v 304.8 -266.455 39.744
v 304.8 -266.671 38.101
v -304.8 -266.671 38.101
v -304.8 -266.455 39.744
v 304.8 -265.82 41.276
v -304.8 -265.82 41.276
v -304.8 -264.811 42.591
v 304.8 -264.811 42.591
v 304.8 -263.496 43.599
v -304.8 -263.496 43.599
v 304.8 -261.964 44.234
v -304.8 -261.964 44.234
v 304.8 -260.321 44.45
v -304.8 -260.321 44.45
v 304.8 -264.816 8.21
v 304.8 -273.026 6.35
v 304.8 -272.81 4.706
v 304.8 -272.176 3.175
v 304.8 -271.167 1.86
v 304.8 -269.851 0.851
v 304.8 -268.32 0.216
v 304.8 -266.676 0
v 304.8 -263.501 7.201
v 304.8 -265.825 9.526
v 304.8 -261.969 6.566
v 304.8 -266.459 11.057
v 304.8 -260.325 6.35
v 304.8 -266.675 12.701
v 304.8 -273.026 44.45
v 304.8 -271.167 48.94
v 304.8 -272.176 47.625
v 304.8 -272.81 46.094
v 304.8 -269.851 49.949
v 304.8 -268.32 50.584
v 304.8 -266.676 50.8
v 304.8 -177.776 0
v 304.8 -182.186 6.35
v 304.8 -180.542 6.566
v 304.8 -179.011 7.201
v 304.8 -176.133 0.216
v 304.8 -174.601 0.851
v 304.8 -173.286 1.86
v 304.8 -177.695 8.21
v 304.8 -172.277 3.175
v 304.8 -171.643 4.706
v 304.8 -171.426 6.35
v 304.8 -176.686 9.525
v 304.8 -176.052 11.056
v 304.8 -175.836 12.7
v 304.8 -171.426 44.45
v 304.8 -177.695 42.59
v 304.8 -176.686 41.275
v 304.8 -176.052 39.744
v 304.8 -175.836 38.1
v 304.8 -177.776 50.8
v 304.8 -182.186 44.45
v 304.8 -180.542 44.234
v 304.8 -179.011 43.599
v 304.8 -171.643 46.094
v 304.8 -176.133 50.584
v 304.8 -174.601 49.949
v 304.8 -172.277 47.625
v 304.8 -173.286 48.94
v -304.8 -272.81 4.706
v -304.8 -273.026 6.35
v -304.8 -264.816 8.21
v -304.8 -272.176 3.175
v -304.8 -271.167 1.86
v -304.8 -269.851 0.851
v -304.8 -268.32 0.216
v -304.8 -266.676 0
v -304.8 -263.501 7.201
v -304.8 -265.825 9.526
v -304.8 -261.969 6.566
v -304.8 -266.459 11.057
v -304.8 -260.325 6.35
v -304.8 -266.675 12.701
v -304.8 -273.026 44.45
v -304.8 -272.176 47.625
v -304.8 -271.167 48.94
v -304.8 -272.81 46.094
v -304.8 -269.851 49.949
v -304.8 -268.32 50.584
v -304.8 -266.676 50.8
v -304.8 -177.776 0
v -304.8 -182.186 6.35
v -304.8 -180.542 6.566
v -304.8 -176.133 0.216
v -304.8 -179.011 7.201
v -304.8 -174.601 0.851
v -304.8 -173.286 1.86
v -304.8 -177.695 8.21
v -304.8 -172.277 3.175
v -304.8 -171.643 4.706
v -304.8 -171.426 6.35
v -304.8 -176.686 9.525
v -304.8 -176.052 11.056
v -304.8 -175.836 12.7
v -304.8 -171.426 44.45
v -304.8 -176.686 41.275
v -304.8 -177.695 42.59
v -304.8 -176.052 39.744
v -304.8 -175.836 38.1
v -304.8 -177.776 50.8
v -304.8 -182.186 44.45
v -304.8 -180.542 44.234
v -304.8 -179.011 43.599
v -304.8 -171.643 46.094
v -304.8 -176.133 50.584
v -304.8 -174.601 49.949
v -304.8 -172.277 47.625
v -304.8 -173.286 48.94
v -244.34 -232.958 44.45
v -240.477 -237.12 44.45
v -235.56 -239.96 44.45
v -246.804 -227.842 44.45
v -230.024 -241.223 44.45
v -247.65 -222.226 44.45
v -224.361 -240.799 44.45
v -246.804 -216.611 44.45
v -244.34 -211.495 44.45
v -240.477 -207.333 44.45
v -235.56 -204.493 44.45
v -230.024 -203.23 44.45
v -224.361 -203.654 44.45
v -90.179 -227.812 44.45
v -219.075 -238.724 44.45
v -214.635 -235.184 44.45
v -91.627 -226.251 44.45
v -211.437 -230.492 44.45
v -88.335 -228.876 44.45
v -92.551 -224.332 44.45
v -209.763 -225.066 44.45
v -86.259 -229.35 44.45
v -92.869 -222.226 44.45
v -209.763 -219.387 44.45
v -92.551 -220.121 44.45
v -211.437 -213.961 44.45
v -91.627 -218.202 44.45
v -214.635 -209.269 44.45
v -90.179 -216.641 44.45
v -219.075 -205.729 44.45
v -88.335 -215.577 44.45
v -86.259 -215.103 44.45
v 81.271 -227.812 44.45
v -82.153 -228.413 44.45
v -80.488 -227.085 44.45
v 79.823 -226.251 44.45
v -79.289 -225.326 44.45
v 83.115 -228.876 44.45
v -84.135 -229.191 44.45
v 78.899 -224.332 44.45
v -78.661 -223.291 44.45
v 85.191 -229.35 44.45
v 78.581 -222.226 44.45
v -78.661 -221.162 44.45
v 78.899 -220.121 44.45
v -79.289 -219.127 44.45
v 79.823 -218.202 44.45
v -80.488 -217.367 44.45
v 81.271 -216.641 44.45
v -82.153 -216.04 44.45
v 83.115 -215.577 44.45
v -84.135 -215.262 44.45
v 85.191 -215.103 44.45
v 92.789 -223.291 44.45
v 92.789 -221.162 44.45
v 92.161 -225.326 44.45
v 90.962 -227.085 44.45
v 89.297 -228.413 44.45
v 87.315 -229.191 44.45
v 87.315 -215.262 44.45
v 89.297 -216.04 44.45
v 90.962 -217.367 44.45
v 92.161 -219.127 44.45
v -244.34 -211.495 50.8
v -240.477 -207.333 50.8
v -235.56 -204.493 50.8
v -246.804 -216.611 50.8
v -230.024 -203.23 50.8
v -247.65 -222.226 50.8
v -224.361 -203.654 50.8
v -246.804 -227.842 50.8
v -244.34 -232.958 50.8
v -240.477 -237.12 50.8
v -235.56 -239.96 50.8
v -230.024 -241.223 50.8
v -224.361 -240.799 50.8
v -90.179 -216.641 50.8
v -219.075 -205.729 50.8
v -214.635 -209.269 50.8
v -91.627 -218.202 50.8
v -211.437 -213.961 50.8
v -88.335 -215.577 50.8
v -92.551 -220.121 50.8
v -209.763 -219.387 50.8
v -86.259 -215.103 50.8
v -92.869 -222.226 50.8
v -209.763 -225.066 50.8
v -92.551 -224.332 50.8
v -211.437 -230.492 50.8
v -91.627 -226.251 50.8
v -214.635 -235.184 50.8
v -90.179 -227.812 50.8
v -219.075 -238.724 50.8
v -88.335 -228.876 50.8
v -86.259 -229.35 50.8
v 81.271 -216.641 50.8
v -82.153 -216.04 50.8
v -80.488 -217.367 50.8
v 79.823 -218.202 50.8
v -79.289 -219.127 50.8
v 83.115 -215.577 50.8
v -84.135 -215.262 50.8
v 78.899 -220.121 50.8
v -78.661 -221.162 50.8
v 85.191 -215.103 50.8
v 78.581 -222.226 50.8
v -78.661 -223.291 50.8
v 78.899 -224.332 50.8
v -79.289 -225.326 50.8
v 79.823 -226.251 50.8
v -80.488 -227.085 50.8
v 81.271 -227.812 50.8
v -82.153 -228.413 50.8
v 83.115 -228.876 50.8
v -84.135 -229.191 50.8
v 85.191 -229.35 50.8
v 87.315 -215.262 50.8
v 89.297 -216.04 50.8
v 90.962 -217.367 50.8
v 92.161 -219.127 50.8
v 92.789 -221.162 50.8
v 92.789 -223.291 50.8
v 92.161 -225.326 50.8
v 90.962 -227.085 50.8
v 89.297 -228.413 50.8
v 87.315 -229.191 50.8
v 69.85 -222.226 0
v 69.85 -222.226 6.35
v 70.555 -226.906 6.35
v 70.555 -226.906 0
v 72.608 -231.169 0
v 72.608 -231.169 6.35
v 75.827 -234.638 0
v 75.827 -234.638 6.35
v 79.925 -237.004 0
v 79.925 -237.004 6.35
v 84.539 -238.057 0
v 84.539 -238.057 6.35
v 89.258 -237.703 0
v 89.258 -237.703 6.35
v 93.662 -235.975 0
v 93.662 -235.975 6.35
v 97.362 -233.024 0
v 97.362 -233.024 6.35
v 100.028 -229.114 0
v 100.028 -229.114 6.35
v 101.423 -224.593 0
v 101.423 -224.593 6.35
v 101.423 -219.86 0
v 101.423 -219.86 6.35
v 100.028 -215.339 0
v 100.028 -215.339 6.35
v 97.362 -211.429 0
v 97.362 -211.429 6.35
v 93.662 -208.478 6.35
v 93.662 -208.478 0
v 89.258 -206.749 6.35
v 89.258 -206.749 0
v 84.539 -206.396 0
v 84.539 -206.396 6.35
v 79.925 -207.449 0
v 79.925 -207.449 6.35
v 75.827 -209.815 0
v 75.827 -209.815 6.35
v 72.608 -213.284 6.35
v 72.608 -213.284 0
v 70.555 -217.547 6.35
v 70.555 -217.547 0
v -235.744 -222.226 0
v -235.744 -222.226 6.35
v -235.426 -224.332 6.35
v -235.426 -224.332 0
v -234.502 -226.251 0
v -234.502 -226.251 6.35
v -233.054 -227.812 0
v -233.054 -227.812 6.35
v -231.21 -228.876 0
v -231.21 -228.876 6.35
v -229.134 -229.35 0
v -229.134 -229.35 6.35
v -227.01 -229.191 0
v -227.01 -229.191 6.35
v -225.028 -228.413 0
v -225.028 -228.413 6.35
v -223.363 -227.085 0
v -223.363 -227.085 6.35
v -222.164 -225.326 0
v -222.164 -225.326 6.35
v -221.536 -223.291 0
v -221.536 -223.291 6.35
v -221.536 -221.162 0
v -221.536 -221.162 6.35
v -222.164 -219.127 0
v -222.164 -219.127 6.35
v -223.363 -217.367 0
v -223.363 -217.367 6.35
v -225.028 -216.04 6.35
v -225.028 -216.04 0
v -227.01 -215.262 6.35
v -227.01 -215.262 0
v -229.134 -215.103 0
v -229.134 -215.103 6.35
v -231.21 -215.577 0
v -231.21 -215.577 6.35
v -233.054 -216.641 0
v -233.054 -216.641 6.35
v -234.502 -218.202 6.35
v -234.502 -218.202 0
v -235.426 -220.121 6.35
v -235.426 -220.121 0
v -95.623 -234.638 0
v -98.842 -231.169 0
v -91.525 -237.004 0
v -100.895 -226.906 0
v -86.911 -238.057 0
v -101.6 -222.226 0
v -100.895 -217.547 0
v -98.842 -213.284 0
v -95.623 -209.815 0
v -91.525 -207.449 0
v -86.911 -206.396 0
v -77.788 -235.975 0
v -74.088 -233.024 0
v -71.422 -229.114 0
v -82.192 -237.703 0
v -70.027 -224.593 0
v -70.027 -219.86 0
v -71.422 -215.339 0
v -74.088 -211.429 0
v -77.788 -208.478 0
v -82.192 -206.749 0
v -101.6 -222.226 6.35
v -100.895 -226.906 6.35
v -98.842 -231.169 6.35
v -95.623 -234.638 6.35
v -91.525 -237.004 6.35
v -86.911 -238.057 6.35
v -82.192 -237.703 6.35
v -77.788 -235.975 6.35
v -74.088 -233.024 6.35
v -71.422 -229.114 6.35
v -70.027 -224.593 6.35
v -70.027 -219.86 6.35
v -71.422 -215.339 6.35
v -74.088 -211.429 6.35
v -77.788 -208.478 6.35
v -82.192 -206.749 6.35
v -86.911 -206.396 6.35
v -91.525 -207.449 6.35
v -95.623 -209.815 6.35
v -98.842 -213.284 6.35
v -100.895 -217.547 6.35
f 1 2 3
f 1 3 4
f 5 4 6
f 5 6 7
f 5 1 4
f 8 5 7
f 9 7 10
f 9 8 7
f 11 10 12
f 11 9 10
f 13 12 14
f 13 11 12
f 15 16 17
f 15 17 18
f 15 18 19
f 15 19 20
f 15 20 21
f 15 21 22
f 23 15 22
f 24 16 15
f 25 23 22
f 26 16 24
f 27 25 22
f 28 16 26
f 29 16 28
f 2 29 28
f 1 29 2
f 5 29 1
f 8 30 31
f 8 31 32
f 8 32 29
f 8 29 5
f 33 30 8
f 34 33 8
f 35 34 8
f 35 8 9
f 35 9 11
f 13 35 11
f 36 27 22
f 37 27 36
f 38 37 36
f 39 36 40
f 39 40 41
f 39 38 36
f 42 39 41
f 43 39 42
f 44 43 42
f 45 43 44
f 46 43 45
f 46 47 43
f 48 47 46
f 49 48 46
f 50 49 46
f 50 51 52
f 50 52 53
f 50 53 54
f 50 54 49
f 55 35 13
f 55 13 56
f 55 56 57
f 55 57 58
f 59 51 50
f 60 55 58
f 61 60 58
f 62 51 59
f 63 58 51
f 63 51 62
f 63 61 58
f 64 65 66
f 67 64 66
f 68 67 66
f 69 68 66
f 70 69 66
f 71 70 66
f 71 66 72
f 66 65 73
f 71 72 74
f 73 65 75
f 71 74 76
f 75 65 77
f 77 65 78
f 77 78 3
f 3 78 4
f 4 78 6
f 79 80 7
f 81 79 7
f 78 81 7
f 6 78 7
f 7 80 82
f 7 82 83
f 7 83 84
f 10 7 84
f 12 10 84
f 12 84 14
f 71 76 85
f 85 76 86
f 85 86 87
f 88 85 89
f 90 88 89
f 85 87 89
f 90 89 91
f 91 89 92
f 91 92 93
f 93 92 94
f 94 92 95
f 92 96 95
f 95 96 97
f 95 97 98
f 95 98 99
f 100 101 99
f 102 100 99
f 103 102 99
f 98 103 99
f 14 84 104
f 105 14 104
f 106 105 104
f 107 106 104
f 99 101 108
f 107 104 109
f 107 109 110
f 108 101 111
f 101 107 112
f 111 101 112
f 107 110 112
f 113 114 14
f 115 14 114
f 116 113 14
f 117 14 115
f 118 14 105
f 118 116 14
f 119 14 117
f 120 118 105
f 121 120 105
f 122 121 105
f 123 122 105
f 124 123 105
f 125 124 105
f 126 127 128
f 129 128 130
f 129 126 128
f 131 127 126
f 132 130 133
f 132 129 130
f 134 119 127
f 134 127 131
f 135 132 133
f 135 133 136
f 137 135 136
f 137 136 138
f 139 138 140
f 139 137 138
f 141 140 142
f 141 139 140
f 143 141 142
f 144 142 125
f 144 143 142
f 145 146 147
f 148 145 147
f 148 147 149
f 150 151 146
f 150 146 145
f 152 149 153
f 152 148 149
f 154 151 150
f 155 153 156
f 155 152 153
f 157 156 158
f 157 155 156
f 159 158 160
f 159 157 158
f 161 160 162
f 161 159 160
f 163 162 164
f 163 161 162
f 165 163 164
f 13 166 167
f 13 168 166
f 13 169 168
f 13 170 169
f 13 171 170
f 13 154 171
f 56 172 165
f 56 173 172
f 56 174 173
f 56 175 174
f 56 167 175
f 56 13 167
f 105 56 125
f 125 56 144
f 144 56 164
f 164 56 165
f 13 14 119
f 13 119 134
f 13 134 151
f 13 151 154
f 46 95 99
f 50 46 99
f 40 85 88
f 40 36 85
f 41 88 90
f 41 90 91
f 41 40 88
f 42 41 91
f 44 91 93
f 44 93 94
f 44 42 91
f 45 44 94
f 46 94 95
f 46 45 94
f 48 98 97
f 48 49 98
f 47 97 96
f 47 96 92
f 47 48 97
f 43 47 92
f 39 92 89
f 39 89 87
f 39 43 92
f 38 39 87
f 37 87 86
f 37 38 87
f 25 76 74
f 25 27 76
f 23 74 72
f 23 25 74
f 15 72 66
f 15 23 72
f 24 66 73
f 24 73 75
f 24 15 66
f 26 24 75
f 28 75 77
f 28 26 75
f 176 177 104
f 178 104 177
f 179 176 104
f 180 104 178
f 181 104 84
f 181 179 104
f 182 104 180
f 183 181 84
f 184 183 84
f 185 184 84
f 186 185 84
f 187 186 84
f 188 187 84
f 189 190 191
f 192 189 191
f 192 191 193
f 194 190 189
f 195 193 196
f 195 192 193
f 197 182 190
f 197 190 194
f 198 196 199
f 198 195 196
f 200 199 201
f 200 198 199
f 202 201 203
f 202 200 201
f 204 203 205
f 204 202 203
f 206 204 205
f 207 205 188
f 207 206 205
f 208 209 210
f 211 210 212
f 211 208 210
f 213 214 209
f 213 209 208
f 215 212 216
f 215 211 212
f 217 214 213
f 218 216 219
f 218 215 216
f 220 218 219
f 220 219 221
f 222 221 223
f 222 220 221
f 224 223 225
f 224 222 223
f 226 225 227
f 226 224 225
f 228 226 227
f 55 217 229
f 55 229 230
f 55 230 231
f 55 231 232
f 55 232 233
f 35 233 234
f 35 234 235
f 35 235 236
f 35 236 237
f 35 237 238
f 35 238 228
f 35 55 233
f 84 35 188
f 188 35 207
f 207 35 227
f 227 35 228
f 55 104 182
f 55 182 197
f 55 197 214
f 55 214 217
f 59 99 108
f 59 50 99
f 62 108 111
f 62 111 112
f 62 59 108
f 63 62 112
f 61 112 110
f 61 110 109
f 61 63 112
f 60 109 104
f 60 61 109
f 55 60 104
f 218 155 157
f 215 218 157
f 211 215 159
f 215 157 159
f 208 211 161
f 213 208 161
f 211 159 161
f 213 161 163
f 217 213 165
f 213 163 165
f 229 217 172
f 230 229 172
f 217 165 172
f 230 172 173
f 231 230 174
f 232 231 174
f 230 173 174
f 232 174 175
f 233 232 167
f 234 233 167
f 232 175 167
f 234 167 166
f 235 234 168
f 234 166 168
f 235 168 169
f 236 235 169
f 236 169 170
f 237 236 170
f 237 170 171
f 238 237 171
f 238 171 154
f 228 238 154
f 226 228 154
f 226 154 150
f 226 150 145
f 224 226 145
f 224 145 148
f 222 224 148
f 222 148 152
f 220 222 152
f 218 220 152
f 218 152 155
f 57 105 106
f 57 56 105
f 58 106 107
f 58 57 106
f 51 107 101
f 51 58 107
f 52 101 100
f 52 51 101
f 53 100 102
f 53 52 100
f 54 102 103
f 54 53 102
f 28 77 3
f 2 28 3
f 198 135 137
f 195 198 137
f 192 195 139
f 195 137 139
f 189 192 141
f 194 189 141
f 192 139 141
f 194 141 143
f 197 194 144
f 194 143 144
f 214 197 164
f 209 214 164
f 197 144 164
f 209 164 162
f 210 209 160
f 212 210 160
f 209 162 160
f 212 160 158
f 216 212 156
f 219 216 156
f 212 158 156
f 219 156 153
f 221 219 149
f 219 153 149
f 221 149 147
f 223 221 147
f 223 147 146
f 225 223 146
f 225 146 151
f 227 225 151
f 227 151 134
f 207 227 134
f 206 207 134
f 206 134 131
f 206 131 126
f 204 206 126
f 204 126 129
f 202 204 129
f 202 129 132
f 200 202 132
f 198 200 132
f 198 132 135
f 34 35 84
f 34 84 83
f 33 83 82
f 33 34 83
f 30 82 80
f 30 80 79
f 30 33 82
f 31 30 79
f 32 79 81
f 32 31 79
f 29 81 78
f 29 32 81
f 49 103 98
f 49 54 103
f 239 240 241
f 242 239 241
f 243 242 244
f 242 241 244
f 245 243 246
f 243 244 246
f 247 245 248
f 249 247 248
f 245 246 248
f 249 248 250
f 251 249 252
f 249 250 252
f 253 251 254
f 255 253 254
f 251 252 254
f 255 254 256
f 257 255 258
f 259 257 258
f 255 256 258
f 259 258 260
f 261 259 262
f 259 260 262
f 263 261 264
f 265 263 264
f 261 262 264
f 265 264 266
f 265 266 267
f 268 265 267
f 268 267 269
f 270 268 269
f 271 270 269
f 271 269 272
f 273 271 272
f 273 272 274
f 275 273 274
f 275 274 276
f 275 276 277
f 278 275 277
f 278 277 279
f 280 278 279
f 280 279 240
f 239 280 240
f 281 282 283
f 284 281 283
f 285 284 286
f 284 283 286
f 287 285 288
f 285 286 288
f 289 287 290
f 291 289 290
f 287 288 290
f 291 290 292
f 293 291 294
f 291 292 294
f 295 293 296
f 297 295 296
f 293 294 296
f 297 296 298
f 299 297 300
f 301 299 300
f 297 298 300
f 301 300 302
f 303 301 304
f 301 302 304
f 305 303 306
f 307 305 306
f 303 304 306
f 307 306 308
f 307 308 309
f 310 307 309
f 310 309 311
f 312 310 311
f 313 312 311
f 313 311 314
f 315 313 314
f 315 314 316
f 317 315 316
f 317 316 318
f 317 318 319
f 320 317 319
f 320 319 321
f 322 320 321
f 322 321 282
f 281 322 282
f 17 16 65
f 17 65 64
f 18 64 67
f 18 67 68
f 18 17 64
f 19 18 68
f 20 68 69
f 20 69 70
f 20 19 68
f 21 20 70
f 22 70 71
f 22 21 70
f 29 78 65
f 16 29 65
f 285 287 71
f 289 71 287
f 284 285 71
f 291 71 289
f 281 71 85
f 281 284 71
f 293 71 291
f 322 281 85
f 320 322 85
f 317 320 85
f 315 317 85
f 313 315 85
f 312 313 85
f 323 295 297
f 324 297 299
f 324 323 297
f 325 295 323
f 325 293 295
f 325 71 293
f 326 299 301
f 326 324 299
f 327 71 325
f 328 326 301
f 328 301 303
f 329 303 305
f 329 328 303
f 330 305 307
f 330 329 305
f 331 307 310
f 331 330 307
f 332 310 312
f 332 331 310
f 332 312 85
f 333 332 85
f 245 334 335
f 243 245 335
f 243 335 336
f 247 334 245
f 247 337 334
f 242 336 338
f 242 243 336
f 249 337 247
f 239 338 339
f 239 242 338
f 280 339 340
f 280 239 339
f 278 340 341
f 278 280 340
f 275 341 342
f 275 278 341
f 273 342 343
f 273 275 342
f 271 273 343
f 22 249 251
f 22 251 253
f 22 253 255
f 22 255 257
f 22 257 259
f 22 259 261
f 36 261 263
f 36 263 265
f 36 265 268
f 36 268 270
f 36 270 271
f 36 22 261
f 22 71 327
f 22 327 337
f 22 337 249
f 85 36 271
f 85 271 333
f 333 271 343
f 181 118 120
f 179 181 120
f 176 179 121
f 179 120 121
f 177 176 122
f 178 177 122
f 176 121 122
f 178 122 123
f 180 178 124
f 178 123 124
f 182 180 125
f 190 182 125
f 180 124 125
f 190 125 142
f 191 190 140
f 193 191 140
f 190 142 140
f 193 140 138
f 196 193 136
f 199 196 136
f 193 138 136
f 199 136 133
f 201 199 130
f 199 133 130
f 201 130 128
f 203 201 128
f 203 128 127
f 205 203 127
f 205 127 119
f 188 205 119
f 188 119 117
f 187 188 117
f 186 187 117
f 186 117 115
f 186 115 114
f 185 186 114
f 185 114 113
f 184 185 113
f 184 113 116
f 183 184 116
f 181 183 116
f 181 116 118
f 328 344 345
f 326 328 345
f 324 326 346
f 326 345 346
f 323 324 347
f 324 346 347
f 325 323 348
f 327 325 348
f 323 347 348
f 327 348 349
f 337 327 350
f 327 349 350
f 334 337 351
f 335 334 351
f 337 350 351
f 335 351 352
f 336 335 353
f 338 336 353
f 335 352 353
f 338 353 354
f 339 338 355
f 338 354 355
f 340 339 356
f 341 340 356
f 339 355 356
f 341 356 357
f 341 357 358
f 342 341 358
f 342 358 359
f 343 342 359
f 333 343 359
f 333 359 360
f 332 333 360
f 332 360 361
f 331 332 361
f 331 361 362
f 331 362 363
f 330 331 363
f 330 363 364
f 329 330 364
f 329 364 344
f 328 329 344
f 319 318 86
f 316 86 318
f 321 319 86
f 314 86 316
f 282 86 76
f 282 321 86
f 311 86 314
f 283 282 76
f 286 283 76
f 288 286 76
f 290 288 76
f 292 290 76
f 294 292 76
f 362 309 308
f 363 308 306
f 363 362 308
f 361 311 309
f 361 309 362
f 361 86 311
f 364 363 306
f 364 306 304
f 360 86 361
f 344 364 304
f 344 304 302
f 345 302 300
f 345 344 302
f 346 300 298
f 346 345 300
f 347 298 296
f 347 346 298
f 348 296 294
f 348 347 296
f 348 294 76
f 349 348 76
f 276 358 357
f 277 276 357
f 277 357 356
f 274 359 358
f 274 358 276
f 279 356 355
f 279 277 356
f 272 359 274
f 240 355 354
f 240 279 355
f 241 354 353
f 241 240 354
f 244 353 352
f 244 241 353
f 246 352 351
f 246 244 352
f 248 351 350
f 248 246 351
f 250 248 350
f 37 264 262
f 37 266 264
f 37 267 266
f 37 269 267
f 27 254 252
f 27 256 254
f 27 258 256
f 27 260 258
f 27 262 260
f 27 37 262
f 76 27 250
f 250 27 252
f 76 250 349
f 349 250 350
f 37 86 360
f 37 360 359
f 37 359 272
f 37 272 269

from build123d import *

# Parameters (mm, degrees)
F2_DEPTH  = 304.8
F4_D      = 14.2875
F4_DEPTH  = 6.35
F6_D      = 38.1
F6_DEPTH  = 6.35
F8_D      = 14.2875
F8_DEPTH  = 6.35
F10_D     = 31.75
F10_DEPTH = 6.35


with BuildPart() as f2:
    # F1 (on Right) → F2 (new body, symmetric)
    with BuildSketch(Plane.YZ):
        with BuildLine():
            Line((-177.776466, 50.8), (-266.676466, 50.8))
            ThreePointArc((-266.676466, 50.8), (-271.166595, 48.940128), (-273.026466, 44.45))
            Line((-273.026466, 44.45), (-273.026466, 37.770297))
            Line((-273.026466, 37.770297), (-273.026466, 6.35))
            ThreePointArc((-273.026466, 6.35), (-271.166595, 1.859872), (-266.676466, 0))
            Line((-266.676466, 0), (-177.776466, 0))
            ThreePointArc((-177.776466, 0), (-173.286338, 1.859872), (-171.426466, 6.35))
            Line((-171.426466, 6.35), (-171.426466, 44.45))
            ThreePointArc((-171.426466, 44.45), (-173.286338, 48.940128), (-177.776466, 50.8))
        make_face()
        with BuildLine():
            ThreePointArc((-266.671124, 38.101069), (-264.810874, 42.590506), (-260.321124, 44.45))
            Line((-260.321124, 44.45), (-182.185624, 44.45))
            ThreePointArc((-182.185624, 44.45), (-177.695496, 42.590128), (-175.835624, 38.1))
            Line((-175.835624, 38.1), (-175.835624, 12.7))
            ThreePointArc((-175.835624, 12.7), (-177.695496, 8.209872), (-182.185624, 6.35))
            Line((-182.185624, 6.35), (-260.325398, 6.35))
            ThreePointArc((-260.325398, 6.35), (-264.815904, 8.21025), (-266.675398, 12.701069))
            Line((-266.675398, 12.701069), (-266.671124, 38.101069))
        make_face(mode=Mode.SUBTRACT)
    extrude(amount=F2_DEPTH, both=True)

    # F4
    with Locations(Plane.XY.offset(50.8)):
        with Locations((-85.725, -222.226466), (85.725, -222.226466)):
            Hole(F4_D / 2, depth=F4_DEPTH)

    # F6
    with Locations(Plane.XY.offset(50.8)):
        with Locations((-228.6, -222.226466)):
            Hole(F6_D / 2, depth=F6_DEPTH)

    # F8
    with Locations(Plane(origin=(0, 0, 0), x_dir=(1, 0, 0), z_dir=(0, 0, -1))):
        with Locations((-228.6, 222.226466)):
            Hole(F8_D / 2, depth=F8_DEPTH)

    # F10
    with Locations(Plane(origin=(0, 0, 0), x_dir=(1, 0, 0), z_dir=(0, 0, -1))):
        with Locations((-85.725, 222.226466), (85.725, 222.226466)):
            Hole(F10_D / 2, depth=F10_DEPTH)


solid = f2.part
